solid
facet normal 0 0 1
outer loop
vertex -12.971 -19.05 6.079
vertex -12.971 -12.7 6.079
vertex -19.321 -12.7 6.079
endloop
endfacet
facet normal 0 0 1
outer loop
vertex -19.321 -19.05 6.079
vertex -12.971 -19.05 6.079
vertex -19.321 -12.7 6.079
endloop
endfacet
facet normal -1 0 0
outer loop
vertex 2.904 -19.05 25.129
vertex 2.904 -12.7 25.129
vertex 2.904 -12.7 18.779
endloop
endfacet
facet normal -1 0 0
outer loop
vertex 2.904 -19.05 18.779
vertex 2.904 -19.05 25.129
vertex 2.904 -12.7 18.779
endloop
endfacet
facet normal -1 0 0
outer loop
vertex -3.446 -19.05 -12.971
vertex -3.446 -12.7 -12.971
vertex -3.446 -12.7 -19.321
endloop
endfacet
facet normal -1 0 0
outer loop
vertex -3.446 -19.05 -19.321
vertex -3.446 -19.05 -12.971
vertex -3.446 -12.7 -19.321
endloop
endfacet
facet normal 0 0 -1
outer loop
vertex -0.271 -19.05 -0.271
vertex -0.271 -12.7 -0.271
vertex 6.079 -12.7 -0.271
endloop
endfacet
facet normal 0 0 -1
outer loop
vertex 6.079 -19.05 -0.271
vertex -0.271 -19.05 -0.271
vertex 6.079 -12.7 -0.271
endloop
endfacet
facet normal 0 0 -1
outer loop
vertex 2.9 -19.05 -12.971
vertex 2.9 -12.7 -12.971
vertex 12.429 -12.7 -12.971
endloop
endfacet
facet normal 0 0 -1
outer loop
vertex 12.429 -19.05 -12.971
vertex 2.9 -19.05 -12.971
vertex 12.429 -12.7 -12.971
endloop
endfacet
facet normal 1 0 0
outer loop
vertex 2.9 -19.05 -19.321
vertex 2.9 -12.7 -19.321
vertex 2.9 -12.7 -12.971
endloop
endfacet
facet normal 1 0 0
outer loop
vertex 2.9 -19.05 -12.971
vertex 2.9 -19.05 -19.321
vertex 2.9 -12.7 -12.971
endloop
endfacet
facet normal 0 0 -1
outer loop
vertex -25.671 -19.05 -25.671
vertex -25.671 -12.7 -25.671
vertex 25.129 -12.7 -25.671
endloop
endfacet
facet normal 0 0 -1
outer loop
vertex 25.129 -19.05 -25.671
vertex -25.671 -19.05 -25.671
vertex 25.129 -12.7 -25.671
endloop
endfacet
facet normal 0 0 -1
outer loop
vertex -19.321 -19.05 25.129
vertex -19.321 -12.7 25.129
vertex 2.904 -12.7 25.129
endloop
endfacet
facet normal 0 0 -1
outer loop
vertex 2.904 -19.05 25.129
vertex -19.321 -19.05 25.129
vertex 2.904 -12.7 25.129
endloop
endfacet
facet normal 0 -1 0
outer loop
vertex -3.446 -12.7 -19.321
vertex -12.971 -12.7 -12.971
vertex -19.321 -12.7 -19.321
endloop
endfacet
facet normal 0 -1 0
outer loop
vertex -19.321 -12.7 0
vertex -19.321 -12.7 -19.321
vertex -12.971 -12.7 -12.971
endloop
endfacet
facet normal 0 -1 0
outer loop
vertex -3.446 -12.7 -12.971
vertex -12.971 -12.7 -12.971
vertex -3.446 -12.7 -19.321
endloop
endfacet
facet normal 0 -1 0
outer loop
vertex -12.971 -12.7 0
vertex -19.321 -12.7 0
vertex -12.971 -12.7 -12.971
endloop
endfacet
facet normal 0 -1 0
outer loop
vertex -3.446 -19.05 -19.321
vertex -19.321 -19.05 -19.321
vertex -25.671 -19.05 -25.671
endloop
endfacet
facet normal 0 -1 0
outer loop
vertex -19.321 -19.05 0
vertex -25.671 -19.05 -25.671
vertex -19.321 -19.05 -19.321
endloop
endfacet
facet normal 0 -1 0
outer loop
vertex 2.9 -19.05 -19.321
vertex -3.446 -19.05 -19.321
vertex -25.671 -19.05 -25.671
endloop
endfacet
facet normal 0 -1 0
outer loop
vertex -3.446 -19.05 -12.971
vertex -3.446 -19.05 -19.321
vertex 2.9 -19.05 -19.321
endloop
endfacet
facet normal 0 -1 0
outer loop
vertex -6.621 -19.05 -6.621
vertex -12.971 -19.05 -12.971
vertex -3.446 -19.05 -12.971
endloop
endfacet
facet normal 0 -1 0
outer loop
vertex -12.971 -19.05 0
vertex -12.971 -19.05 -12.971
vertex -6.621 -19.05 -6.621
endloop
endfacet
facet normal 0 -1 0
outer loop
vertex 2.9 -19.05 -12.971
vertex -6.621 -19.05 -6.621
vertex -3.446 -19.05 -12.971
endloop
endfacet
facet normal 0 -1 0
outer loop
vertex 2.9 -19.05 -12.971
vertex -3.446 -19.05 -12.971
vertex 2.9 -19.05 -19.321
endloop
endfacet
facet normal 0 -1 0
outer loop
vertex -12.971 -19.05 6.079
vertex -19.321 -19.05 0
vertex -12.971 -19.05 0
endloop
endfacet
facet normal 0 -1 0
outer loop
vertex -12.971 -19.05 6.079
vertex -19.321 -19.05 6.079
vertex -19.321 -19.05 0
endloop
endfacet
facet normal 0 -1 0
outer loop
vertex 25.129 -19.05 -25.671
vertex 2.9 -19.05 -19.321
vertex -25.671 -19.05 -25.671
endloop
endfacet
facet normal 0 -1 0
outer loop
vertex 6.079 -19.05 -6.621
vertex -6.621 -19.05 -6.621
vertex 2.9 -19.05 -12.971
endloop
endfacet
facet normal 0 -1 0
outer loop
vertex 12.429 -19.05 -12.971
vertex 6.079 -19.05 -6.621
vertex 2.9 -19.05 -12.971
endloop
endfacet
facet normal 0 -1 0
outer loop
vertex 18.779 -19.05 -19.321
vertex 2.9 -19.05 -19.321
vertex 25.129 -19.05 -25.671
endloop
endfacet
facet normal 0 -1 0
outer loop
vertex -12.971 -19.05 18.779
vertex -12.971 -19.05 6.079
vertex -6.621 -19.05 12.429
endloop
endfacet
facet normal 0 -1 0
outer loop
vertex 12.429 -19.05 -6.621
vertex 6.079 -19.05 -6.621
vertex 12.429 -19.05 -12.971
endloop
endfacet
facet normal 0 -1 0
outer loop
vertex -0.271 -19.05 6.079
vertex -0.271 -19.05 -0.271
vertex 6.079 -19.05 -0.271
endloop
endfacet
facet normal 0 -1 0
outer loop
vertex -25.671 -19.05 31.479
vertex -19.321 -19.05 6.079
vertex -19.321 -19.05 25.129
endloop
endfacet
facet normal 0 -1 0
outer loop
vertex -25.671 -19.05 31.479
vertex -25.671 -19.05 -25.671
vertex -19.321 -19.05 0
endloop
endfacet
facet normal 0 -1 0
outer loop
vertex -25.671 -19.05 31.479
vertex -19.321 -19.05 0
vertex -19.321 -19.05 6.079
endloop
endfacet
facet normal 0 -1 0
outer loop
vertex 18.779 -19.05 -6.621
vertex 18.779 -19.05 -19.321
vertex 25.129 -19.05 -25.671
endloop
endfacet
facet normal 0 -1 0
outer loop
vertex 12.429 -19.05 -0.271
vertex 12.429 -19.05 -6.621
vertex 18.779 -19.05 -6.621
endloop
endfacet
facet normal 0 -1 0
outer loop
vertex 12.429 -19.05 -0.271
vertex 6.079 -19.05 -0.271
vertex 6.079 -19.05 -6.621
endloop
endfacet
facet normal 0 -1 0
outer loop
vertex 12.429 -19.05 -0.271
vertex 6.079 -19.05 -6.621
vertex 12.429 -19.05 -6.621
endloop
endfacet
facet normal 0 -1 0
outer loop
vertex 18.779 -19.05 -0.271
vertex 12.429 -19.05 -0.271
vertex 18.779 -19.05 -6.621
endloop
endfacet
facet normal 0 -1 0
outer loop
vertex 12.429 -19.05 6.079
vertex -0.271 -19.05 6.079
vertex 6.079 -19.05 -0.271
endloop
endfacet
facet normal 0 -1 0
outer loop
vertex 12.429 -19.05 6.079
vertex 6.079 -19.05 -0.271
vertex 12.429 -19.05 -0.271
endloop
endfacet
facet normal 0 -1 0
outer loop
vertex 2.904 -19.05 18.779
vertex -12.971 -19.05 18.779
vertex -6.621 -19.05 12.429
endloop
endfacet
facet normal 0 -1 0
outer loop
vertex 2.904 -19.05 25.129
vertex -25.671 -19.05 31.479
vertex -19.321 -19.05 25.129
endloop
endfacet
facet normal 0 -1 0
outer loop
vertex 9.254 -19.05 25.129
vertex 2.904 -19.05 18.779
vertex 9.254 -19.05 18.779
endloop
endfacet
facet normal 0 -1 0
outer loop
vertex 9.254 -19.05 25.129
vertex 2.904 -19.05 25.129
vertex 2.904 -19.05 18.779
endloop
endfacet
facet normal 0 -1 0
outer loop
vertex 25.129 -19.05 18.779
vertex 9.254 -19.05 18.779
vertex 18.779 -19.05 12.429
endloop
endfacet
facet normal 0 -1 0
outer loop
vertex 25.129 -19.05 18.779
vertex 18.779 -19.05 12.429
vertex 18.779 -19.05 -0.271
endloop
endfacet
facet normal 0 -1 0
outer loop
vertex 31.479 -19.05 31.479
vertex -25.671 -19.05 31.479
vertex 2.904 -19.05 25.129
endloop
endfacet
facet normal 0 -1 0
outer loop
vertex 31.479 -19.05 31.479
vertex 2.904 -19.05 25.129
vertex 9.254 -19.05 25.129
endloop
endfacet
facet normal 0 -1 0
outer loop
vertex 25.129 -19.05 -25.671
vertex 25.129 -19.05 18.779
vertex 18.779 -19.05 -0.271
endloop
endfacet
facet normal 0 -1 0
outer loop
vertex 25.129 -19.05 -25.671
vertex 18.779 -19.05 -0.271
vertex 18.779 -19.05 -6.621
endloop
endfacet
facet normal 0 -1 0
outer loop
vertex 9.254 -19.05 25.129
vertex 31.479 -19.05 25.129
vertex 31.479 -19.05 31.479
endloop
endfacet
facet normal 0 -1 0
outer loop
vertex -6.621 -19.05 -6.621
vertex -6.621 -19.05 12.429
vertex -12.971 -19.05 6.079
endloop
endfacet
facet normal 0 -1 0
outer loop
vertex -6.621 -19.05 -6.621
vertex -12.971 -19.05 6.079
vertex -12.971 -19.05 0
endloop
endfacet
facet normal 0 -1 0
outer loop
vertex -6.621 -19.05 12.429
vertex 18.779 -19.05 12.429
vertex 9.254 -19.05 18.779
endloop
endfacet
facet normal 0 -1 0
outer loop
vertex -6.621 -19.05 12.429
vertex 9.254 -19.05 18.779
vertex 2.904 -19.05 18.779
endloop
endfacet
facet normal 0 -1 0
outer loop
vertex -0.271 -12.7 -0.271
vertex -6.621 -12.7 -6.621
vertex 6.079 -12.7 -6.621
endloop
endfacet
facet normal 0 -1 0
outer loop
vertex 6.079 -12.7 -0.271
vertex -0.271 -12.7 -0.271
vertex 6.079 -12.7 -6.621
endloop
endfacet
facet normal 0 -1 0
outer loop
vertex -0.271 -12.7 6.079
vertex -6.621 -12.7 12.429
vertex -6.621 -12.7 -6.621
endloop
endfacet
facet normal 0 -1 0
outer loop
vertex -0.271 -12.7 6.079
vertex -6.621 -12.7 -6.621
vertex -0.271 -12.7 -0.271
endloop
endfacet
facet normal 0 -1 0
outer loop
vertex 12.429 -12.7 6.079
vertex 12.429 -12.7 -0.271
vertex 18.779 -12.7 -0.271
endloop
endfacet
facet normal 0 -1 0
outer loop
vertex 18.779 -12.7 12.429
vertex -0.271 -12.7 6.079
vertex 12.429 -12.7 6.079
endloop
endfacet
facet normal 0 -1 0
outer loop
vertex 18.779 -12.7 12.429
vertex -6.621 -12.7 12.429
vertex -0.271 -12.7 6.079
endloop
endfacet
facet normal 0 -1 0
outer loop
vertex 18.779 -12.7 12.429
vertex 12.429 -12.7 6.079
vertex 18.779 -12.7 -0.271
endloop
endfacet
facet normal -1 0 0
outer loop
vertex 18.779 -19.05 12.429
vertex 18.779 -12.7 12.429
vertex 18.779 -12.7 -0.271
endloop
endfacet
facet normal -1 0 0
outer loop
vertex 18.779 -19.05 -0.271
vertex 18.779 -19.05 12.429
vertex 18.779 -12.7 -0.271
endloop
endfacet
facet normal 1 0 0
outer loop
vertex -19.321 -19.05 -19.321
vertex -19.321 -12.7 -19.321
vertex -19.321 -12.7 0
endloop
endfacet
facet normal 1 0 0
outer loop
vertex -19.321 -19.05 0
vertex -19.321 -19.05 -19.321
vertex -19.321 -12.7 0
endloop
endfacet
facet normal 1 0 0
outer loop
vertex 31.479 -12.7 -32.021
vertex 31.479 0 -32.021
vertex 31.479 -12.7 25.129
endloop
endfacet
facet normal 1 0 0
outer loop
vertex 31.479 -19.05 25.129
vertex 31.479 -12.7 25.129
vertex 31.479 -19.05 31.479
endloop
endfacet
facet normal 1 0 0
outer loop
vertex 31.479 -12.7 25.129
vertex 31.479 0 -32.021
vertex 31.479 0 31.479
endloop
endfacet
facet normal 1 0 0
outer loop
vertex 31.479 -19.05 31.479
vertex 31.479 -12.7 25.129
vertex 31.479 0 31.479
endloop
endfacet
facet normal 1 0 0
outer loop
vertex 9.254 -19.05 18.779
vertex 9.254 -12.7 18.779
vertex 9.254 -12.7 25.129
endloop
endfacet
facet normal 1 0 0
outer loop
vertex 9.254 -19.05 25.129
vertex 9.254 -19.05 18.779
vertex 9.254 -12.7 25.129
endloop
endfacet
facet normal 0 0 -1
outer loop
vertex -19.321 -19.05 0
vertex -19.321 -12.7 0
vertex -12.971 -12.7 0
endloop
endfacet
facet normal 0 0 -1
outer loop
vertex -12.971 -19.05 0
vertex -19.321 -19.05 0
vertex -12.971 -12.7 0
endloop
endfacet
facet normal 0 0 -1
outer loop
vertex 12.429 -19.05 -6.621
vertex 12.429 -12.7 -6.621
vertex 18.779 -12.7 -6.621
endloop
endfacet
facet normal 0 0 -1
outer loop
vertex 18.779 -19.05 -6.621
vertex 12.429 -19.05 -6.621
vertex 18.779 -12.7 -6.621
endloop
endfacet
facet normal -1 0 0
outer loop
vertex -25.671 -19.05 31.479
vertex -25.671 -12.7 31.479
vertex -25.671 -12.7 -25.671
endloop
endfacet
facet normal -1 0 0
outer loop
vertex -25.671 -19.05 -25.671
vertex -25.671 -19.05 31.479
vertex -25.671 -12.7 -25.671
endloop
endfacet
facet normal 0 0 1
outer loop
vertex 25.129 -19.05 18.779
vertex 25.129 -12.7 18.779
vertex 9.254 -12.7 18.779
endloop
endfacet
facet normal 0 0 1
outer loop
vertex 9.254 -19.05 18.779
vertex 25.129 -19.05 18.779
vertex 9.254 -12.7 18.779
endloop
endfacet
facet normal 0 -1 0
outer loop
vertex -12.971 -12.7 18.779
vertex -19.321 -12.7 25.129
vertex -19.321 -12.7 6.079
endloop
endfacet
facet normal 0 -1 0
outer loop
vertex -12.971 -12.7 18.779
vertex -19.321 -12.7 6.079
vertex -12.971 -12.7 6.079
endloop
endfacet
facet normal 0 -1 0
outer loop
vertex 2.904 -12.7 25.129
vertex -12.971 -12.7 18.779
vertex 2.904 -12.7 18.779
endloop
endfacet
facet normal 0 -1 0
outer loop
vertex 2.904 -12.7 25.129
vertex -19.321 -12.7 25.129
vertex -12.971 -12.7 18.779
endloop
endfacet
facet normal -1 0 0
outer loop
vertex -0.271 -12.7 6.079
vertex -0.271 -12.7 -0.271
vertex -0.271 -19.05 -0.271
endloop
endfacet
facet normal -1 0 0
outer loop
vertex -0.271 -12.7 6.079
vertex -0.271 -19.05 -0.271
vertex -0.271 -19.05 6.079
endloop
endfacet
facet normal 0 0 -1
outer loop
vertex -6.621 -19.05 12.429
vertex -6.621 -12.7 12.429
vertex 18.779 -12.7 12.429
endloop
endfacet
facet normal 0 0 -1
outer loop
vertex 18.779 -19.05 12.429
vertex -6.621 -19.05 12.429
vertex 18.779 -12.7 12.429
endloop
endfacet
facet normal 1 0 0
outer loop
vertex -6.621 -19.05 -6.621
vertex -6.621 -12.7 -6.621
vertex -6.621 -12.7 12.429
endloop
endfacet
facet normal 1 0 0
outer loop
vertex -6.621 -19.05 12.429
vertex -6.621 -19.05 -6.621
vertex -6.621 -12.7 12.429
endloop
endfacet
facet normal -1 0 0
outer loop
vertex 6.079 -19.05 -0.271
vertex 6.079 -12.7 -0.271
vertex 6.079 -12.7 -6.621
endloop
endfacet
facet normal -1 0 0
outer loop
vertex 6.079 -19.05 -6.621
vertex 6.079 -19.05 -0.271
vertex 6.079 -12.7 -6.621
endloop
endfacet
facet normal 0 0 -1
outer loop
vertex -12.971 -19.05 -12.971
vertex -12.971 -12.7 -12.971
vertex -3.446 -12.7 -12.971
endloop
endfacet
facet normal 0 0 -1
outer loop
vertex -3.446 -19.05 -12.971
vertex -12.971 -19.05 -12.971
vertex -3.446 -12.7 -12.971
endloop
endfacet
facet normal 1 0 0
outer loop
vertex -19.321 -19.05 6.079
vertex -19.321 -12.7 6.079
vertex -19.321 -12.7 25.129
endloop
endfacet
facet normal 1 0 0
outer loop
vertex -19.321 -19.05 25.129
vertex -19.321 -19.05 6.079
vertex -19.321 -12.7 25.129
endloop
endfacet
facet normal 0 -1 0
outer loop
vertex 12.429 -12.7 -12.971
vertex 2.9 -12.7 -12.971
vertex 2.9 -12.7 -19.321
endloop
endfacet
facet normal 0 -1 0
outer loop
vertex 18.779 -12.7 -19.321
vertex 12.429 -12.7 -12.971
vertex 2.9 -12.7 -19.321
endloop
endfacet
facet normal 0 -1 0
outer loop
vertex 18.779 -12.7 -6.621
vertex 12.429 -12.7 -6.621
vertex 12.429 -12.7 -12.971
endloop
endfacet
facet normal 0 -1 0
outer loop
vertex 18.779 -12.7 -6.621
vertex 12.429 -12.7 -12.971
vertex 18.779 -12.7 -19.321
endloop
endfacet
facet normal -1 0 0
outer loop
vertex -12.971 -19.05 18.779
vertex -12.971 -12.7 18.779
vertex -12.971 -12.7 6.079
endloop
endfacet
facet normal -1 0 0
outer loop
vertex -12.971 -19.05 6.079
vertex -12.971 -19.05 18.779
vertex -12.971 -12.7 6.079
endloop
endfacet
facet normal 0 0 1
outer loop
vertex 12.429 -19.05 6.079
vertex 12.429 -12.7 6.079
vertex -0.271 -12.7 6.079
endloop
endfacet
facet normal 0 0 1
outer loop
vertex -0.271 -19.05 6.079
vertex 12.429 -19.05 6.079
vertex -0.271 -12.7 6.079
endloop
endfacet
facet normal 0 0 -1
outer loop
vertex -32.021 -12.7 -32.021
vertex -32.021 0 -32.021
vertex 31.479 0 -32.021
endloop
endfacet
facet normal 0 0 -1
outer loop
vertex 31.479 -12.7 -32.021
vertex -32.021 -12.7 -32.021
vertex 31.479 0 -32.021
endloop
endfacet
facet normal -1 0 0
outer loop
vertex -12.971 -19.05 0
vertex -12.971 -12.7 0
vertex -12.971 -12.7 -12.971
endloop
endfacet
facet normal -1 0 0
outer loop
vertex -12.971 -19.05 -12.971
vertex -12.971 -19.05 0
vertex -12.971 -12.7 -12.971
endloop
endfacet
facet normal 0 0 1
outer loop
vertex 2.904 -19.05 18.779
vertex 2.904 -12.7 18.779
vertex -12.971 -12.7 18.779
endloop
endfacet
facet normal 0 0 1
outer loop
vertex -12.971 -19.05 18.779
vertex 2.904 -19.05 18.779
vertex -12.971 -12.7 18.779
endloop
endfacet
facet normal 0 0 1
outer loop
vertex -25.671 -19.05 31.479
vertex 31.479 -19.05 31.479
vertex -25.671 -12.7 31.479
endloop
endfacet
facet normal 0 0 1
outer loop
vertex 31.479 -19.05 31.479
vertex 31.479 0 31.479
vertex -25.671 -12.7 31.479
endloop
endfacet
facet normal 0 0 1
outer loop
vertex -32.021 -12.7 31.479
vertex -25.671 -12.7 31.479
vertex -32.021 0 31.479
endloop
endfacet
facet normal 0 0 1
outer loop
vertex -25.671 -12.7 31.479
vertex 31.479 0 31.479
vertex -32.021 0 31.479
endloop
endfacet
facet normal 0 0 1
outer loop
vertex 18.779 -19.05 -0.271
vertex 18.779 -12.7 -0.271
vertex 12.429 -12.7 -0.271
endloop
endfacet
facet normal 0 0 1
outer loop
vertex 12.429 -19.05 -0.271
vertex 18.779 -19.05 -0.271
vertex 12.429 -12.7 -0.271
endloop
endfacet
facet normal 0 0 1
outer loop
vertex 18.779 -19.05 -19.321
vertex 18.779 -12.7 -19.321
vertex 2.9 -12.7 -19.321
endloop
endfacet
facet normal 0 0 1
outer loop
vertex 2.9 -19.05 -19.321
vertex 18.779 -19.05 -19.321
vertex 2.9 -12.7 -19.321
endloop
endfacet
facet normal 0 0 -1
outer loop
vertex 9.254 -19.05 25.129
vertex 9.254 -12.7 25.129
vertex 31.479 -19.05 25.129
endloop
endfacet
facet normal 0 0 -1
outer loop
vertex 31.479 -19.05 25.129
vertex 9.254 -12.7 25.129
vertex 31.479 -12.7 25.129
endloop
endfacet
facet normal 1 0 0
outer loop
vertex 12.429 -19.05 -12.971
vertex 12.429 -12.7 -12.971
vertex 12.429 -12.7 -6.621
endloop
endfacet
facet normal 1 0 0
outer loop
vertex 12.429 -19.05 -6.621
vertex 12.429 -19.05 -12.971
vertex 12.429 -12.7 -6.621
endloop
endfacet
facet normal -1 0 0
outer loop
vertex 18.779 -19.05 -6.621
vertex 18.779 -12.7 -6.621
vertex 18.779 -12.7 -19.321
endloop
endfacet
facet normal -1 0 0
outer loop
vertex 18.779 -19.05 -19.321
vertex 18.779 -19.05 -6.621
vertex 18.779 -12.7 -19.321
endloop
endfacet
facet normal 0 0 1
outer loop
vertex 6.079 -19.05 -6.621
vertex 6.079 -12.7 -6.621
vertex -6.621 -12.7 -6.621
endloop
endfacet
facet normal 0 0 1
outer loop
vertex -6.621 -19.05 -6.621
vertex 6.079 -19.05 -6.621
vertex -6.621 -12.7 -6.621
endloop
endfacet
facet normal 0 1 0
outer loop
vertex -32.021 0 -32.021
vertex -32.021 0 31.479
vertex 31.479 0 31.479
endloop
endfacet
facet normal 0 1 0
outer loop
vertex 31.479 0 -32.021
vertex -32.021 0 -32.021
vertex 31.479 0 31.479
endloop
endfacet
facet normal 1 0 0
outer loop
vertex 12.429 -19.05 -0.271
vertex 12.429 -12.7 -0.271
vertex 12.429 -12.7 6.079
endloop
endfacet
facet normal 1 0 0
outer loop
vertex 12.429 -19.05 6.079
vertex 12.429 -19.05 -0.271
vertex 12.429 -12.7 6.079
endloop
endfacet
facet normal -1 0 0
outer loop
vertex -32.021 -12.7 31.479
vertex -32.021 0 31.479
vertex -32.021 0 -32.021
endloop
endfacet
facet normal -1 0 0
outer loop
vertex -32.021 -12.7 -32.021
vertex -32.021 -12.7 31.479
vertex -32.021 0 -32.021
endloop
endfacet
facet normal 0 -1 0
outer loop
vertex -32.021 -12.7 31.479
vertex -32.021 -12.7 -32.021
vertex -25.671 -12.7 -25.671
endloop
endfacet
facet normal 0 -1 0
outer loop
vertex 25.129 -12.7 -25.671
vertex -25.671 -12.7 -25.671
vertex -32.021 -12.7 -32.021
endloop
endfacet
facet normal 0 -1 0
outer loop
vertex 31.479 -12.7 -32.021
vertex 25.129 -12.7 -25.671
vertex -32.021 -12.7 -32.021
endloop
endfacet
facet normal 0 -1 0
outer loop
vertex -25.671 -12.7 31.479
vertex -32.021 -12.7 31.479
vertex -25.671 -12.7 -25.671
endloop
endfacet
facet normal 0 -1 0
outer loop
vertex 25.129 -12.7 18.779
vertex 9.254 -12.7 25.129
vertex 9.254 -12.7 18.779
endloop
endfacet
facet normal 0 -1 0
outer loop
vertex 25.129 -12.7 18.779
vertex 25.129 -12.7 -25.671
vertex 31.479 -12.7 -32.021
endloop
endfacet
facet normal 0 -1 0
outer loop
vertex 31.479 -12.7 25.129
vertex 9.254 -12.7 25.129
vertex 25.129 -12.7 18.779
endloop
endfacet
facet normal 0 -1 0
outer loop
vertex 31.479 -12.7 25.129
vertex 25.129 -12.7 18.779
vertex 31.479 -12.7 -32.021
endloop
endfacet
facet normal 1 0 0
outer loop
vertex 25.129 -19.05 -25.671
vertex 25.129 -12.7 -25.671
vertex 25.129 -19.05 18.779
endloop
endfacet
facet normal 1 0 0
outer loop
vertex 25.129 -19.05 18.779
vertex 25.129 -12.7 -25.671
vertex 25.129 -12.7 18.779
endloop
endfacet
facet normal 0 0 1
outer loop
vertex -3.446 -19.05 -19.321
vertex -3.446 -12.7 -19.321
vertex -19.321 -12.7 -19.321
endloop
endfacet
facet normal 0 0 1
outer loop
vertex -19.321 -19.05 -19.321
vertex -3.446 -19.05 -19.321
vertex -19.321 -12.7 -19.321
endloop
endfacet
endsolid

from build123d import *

# Parameters (mm, degrees)
F0_W     = 32.0205967701
F0_H     = 31.4794032299
F1_DEPTH = 12.7
F2_W     = 6.35
F2_H     = 6.35
F3_DEPTH = 6.35
F5_DEPTH = 6.35


with BuildPart() as f1:
    # F0 (on Front) → F1 (new body)
    with BuildSketch(Plane.XZ):
        with Locations((-16.0102983851, 15.7397016149)):
            Rectangle(F0_W, F0_H)
        Polygon((0, 31.4794032299), (0, 0), (-32.0205967701, 0), (-32.0205967701, -32.0205967701), (31.4794032299, -32.0205967701), (31.4794032299, 31.4794032299), align=None)
    extrude(amount=F1_DEPTH)

    # F2 (on face) → F3 (join)
    with BuildSketch(Plane.XZ.offset(12.7)):
        Polygon((31.4794032299, 25.1294032299), (31.4794032299, 31.4794032299), (-25.6705967701, 31.4794032299), (-25.6705967701, 25.1294032299), (-19.3205967701, 25.1294032299), align=None)
        Polygon((-19.3205967701, -19.3205967701), (-19.3205967701, 25.1294032299), (-25.6705967701, 25.1294032299), (-25.6705967701, -25.6705967701), (-19.3205967701, -25.6705967701), align=None)
        Polygon((18.7794032299, -19.3205967701), (-19.3205967701, -19.3205967701), (-19.3205967701, -25.6705967701), (25.1294032299, -25.6705967701), (25.1294032299, -19.3205967701), align=None)
        Polygon((18.7794032299, 12.4294032299), (18.7794032299, -19.3205967701), (25.1294032299, -19.3205967701), (25.1294032299, 18.7794032299), (18.7794032299, 18.7794032299), align=None)
        Polygon((-6.6205967701, 12.4294032299), (18.7794032299, 12.4294032299), (18.7794032299, 18.7794032299), (-12.9705967701, 18.7794032299), (-12.9705967701, 12.4294032299), align=None)
        Polygon((-6.6205967701, -6.6205967701), (-6.6205967701, 12.4294032299), (-12.9705967701, 12.4294032299), (-12.9705967701, -12.9705967701), (-6.6205967701, -12.9705967701), align=None)
        Polygon((6.0794032299, -6.6205967701), (-6.6205967701, -6.6205967701), (-6.6205967701, -12.9705967701), (12.4294032299, -12.9705967701), (12.4294032299, -6.6205967701), align=None)
        Polygon((6.0794032299, -0.2705967701), (6.0794032299, -6.6205967701), (12.4294032299, -6.6205967701), (12.4294032299, 6.0794032299), (6.0794032299, 6.0794032299), align=None)
        with Locations((2.9044032299, 2.9044032299)):
            Rectangle(F2_W, F2_H)
    extrude(amount=F3_DEPTH)

    # F4 (on face) → F5 (join)
    with BuildSketch(Plane.XZ.offset(12.7)):
        Polygon((2.9044032299, 18.7794032299), (6.0794032299, 18.7794032299), (9.2544032299, 18.7794032299), (9.2544032299, 25.1294032299), (2.9044032299, 25.1294032299), align=None)
        Polygon((-12.9705967701, 2.9044032299), (-12.9705967701, 6.0794032299), (-19.3205967701, 6.0794032299), (-19.3205967701, 0), (-12.9705967701, 0), align=None)
        Polygon((-3.4455967701, -12.9705967701), (-3.4455967701, -19.3205967701), (2.8999124188, -19.3205967701), (2.8999124188, -12.9705967701), (-0.2705967701, -12.9705967701), align=None)
        Polygon((12.4294032299, -6.6205967701), (18.7794032299, -6.6205967701), (18.7794032299, -0.2705967701), (12.4294032299, -0.2705967701), (12.4294032299, -3.4455967701), align=None)
    extrude(amount=F5_DEPTH)


solid = f1.part
